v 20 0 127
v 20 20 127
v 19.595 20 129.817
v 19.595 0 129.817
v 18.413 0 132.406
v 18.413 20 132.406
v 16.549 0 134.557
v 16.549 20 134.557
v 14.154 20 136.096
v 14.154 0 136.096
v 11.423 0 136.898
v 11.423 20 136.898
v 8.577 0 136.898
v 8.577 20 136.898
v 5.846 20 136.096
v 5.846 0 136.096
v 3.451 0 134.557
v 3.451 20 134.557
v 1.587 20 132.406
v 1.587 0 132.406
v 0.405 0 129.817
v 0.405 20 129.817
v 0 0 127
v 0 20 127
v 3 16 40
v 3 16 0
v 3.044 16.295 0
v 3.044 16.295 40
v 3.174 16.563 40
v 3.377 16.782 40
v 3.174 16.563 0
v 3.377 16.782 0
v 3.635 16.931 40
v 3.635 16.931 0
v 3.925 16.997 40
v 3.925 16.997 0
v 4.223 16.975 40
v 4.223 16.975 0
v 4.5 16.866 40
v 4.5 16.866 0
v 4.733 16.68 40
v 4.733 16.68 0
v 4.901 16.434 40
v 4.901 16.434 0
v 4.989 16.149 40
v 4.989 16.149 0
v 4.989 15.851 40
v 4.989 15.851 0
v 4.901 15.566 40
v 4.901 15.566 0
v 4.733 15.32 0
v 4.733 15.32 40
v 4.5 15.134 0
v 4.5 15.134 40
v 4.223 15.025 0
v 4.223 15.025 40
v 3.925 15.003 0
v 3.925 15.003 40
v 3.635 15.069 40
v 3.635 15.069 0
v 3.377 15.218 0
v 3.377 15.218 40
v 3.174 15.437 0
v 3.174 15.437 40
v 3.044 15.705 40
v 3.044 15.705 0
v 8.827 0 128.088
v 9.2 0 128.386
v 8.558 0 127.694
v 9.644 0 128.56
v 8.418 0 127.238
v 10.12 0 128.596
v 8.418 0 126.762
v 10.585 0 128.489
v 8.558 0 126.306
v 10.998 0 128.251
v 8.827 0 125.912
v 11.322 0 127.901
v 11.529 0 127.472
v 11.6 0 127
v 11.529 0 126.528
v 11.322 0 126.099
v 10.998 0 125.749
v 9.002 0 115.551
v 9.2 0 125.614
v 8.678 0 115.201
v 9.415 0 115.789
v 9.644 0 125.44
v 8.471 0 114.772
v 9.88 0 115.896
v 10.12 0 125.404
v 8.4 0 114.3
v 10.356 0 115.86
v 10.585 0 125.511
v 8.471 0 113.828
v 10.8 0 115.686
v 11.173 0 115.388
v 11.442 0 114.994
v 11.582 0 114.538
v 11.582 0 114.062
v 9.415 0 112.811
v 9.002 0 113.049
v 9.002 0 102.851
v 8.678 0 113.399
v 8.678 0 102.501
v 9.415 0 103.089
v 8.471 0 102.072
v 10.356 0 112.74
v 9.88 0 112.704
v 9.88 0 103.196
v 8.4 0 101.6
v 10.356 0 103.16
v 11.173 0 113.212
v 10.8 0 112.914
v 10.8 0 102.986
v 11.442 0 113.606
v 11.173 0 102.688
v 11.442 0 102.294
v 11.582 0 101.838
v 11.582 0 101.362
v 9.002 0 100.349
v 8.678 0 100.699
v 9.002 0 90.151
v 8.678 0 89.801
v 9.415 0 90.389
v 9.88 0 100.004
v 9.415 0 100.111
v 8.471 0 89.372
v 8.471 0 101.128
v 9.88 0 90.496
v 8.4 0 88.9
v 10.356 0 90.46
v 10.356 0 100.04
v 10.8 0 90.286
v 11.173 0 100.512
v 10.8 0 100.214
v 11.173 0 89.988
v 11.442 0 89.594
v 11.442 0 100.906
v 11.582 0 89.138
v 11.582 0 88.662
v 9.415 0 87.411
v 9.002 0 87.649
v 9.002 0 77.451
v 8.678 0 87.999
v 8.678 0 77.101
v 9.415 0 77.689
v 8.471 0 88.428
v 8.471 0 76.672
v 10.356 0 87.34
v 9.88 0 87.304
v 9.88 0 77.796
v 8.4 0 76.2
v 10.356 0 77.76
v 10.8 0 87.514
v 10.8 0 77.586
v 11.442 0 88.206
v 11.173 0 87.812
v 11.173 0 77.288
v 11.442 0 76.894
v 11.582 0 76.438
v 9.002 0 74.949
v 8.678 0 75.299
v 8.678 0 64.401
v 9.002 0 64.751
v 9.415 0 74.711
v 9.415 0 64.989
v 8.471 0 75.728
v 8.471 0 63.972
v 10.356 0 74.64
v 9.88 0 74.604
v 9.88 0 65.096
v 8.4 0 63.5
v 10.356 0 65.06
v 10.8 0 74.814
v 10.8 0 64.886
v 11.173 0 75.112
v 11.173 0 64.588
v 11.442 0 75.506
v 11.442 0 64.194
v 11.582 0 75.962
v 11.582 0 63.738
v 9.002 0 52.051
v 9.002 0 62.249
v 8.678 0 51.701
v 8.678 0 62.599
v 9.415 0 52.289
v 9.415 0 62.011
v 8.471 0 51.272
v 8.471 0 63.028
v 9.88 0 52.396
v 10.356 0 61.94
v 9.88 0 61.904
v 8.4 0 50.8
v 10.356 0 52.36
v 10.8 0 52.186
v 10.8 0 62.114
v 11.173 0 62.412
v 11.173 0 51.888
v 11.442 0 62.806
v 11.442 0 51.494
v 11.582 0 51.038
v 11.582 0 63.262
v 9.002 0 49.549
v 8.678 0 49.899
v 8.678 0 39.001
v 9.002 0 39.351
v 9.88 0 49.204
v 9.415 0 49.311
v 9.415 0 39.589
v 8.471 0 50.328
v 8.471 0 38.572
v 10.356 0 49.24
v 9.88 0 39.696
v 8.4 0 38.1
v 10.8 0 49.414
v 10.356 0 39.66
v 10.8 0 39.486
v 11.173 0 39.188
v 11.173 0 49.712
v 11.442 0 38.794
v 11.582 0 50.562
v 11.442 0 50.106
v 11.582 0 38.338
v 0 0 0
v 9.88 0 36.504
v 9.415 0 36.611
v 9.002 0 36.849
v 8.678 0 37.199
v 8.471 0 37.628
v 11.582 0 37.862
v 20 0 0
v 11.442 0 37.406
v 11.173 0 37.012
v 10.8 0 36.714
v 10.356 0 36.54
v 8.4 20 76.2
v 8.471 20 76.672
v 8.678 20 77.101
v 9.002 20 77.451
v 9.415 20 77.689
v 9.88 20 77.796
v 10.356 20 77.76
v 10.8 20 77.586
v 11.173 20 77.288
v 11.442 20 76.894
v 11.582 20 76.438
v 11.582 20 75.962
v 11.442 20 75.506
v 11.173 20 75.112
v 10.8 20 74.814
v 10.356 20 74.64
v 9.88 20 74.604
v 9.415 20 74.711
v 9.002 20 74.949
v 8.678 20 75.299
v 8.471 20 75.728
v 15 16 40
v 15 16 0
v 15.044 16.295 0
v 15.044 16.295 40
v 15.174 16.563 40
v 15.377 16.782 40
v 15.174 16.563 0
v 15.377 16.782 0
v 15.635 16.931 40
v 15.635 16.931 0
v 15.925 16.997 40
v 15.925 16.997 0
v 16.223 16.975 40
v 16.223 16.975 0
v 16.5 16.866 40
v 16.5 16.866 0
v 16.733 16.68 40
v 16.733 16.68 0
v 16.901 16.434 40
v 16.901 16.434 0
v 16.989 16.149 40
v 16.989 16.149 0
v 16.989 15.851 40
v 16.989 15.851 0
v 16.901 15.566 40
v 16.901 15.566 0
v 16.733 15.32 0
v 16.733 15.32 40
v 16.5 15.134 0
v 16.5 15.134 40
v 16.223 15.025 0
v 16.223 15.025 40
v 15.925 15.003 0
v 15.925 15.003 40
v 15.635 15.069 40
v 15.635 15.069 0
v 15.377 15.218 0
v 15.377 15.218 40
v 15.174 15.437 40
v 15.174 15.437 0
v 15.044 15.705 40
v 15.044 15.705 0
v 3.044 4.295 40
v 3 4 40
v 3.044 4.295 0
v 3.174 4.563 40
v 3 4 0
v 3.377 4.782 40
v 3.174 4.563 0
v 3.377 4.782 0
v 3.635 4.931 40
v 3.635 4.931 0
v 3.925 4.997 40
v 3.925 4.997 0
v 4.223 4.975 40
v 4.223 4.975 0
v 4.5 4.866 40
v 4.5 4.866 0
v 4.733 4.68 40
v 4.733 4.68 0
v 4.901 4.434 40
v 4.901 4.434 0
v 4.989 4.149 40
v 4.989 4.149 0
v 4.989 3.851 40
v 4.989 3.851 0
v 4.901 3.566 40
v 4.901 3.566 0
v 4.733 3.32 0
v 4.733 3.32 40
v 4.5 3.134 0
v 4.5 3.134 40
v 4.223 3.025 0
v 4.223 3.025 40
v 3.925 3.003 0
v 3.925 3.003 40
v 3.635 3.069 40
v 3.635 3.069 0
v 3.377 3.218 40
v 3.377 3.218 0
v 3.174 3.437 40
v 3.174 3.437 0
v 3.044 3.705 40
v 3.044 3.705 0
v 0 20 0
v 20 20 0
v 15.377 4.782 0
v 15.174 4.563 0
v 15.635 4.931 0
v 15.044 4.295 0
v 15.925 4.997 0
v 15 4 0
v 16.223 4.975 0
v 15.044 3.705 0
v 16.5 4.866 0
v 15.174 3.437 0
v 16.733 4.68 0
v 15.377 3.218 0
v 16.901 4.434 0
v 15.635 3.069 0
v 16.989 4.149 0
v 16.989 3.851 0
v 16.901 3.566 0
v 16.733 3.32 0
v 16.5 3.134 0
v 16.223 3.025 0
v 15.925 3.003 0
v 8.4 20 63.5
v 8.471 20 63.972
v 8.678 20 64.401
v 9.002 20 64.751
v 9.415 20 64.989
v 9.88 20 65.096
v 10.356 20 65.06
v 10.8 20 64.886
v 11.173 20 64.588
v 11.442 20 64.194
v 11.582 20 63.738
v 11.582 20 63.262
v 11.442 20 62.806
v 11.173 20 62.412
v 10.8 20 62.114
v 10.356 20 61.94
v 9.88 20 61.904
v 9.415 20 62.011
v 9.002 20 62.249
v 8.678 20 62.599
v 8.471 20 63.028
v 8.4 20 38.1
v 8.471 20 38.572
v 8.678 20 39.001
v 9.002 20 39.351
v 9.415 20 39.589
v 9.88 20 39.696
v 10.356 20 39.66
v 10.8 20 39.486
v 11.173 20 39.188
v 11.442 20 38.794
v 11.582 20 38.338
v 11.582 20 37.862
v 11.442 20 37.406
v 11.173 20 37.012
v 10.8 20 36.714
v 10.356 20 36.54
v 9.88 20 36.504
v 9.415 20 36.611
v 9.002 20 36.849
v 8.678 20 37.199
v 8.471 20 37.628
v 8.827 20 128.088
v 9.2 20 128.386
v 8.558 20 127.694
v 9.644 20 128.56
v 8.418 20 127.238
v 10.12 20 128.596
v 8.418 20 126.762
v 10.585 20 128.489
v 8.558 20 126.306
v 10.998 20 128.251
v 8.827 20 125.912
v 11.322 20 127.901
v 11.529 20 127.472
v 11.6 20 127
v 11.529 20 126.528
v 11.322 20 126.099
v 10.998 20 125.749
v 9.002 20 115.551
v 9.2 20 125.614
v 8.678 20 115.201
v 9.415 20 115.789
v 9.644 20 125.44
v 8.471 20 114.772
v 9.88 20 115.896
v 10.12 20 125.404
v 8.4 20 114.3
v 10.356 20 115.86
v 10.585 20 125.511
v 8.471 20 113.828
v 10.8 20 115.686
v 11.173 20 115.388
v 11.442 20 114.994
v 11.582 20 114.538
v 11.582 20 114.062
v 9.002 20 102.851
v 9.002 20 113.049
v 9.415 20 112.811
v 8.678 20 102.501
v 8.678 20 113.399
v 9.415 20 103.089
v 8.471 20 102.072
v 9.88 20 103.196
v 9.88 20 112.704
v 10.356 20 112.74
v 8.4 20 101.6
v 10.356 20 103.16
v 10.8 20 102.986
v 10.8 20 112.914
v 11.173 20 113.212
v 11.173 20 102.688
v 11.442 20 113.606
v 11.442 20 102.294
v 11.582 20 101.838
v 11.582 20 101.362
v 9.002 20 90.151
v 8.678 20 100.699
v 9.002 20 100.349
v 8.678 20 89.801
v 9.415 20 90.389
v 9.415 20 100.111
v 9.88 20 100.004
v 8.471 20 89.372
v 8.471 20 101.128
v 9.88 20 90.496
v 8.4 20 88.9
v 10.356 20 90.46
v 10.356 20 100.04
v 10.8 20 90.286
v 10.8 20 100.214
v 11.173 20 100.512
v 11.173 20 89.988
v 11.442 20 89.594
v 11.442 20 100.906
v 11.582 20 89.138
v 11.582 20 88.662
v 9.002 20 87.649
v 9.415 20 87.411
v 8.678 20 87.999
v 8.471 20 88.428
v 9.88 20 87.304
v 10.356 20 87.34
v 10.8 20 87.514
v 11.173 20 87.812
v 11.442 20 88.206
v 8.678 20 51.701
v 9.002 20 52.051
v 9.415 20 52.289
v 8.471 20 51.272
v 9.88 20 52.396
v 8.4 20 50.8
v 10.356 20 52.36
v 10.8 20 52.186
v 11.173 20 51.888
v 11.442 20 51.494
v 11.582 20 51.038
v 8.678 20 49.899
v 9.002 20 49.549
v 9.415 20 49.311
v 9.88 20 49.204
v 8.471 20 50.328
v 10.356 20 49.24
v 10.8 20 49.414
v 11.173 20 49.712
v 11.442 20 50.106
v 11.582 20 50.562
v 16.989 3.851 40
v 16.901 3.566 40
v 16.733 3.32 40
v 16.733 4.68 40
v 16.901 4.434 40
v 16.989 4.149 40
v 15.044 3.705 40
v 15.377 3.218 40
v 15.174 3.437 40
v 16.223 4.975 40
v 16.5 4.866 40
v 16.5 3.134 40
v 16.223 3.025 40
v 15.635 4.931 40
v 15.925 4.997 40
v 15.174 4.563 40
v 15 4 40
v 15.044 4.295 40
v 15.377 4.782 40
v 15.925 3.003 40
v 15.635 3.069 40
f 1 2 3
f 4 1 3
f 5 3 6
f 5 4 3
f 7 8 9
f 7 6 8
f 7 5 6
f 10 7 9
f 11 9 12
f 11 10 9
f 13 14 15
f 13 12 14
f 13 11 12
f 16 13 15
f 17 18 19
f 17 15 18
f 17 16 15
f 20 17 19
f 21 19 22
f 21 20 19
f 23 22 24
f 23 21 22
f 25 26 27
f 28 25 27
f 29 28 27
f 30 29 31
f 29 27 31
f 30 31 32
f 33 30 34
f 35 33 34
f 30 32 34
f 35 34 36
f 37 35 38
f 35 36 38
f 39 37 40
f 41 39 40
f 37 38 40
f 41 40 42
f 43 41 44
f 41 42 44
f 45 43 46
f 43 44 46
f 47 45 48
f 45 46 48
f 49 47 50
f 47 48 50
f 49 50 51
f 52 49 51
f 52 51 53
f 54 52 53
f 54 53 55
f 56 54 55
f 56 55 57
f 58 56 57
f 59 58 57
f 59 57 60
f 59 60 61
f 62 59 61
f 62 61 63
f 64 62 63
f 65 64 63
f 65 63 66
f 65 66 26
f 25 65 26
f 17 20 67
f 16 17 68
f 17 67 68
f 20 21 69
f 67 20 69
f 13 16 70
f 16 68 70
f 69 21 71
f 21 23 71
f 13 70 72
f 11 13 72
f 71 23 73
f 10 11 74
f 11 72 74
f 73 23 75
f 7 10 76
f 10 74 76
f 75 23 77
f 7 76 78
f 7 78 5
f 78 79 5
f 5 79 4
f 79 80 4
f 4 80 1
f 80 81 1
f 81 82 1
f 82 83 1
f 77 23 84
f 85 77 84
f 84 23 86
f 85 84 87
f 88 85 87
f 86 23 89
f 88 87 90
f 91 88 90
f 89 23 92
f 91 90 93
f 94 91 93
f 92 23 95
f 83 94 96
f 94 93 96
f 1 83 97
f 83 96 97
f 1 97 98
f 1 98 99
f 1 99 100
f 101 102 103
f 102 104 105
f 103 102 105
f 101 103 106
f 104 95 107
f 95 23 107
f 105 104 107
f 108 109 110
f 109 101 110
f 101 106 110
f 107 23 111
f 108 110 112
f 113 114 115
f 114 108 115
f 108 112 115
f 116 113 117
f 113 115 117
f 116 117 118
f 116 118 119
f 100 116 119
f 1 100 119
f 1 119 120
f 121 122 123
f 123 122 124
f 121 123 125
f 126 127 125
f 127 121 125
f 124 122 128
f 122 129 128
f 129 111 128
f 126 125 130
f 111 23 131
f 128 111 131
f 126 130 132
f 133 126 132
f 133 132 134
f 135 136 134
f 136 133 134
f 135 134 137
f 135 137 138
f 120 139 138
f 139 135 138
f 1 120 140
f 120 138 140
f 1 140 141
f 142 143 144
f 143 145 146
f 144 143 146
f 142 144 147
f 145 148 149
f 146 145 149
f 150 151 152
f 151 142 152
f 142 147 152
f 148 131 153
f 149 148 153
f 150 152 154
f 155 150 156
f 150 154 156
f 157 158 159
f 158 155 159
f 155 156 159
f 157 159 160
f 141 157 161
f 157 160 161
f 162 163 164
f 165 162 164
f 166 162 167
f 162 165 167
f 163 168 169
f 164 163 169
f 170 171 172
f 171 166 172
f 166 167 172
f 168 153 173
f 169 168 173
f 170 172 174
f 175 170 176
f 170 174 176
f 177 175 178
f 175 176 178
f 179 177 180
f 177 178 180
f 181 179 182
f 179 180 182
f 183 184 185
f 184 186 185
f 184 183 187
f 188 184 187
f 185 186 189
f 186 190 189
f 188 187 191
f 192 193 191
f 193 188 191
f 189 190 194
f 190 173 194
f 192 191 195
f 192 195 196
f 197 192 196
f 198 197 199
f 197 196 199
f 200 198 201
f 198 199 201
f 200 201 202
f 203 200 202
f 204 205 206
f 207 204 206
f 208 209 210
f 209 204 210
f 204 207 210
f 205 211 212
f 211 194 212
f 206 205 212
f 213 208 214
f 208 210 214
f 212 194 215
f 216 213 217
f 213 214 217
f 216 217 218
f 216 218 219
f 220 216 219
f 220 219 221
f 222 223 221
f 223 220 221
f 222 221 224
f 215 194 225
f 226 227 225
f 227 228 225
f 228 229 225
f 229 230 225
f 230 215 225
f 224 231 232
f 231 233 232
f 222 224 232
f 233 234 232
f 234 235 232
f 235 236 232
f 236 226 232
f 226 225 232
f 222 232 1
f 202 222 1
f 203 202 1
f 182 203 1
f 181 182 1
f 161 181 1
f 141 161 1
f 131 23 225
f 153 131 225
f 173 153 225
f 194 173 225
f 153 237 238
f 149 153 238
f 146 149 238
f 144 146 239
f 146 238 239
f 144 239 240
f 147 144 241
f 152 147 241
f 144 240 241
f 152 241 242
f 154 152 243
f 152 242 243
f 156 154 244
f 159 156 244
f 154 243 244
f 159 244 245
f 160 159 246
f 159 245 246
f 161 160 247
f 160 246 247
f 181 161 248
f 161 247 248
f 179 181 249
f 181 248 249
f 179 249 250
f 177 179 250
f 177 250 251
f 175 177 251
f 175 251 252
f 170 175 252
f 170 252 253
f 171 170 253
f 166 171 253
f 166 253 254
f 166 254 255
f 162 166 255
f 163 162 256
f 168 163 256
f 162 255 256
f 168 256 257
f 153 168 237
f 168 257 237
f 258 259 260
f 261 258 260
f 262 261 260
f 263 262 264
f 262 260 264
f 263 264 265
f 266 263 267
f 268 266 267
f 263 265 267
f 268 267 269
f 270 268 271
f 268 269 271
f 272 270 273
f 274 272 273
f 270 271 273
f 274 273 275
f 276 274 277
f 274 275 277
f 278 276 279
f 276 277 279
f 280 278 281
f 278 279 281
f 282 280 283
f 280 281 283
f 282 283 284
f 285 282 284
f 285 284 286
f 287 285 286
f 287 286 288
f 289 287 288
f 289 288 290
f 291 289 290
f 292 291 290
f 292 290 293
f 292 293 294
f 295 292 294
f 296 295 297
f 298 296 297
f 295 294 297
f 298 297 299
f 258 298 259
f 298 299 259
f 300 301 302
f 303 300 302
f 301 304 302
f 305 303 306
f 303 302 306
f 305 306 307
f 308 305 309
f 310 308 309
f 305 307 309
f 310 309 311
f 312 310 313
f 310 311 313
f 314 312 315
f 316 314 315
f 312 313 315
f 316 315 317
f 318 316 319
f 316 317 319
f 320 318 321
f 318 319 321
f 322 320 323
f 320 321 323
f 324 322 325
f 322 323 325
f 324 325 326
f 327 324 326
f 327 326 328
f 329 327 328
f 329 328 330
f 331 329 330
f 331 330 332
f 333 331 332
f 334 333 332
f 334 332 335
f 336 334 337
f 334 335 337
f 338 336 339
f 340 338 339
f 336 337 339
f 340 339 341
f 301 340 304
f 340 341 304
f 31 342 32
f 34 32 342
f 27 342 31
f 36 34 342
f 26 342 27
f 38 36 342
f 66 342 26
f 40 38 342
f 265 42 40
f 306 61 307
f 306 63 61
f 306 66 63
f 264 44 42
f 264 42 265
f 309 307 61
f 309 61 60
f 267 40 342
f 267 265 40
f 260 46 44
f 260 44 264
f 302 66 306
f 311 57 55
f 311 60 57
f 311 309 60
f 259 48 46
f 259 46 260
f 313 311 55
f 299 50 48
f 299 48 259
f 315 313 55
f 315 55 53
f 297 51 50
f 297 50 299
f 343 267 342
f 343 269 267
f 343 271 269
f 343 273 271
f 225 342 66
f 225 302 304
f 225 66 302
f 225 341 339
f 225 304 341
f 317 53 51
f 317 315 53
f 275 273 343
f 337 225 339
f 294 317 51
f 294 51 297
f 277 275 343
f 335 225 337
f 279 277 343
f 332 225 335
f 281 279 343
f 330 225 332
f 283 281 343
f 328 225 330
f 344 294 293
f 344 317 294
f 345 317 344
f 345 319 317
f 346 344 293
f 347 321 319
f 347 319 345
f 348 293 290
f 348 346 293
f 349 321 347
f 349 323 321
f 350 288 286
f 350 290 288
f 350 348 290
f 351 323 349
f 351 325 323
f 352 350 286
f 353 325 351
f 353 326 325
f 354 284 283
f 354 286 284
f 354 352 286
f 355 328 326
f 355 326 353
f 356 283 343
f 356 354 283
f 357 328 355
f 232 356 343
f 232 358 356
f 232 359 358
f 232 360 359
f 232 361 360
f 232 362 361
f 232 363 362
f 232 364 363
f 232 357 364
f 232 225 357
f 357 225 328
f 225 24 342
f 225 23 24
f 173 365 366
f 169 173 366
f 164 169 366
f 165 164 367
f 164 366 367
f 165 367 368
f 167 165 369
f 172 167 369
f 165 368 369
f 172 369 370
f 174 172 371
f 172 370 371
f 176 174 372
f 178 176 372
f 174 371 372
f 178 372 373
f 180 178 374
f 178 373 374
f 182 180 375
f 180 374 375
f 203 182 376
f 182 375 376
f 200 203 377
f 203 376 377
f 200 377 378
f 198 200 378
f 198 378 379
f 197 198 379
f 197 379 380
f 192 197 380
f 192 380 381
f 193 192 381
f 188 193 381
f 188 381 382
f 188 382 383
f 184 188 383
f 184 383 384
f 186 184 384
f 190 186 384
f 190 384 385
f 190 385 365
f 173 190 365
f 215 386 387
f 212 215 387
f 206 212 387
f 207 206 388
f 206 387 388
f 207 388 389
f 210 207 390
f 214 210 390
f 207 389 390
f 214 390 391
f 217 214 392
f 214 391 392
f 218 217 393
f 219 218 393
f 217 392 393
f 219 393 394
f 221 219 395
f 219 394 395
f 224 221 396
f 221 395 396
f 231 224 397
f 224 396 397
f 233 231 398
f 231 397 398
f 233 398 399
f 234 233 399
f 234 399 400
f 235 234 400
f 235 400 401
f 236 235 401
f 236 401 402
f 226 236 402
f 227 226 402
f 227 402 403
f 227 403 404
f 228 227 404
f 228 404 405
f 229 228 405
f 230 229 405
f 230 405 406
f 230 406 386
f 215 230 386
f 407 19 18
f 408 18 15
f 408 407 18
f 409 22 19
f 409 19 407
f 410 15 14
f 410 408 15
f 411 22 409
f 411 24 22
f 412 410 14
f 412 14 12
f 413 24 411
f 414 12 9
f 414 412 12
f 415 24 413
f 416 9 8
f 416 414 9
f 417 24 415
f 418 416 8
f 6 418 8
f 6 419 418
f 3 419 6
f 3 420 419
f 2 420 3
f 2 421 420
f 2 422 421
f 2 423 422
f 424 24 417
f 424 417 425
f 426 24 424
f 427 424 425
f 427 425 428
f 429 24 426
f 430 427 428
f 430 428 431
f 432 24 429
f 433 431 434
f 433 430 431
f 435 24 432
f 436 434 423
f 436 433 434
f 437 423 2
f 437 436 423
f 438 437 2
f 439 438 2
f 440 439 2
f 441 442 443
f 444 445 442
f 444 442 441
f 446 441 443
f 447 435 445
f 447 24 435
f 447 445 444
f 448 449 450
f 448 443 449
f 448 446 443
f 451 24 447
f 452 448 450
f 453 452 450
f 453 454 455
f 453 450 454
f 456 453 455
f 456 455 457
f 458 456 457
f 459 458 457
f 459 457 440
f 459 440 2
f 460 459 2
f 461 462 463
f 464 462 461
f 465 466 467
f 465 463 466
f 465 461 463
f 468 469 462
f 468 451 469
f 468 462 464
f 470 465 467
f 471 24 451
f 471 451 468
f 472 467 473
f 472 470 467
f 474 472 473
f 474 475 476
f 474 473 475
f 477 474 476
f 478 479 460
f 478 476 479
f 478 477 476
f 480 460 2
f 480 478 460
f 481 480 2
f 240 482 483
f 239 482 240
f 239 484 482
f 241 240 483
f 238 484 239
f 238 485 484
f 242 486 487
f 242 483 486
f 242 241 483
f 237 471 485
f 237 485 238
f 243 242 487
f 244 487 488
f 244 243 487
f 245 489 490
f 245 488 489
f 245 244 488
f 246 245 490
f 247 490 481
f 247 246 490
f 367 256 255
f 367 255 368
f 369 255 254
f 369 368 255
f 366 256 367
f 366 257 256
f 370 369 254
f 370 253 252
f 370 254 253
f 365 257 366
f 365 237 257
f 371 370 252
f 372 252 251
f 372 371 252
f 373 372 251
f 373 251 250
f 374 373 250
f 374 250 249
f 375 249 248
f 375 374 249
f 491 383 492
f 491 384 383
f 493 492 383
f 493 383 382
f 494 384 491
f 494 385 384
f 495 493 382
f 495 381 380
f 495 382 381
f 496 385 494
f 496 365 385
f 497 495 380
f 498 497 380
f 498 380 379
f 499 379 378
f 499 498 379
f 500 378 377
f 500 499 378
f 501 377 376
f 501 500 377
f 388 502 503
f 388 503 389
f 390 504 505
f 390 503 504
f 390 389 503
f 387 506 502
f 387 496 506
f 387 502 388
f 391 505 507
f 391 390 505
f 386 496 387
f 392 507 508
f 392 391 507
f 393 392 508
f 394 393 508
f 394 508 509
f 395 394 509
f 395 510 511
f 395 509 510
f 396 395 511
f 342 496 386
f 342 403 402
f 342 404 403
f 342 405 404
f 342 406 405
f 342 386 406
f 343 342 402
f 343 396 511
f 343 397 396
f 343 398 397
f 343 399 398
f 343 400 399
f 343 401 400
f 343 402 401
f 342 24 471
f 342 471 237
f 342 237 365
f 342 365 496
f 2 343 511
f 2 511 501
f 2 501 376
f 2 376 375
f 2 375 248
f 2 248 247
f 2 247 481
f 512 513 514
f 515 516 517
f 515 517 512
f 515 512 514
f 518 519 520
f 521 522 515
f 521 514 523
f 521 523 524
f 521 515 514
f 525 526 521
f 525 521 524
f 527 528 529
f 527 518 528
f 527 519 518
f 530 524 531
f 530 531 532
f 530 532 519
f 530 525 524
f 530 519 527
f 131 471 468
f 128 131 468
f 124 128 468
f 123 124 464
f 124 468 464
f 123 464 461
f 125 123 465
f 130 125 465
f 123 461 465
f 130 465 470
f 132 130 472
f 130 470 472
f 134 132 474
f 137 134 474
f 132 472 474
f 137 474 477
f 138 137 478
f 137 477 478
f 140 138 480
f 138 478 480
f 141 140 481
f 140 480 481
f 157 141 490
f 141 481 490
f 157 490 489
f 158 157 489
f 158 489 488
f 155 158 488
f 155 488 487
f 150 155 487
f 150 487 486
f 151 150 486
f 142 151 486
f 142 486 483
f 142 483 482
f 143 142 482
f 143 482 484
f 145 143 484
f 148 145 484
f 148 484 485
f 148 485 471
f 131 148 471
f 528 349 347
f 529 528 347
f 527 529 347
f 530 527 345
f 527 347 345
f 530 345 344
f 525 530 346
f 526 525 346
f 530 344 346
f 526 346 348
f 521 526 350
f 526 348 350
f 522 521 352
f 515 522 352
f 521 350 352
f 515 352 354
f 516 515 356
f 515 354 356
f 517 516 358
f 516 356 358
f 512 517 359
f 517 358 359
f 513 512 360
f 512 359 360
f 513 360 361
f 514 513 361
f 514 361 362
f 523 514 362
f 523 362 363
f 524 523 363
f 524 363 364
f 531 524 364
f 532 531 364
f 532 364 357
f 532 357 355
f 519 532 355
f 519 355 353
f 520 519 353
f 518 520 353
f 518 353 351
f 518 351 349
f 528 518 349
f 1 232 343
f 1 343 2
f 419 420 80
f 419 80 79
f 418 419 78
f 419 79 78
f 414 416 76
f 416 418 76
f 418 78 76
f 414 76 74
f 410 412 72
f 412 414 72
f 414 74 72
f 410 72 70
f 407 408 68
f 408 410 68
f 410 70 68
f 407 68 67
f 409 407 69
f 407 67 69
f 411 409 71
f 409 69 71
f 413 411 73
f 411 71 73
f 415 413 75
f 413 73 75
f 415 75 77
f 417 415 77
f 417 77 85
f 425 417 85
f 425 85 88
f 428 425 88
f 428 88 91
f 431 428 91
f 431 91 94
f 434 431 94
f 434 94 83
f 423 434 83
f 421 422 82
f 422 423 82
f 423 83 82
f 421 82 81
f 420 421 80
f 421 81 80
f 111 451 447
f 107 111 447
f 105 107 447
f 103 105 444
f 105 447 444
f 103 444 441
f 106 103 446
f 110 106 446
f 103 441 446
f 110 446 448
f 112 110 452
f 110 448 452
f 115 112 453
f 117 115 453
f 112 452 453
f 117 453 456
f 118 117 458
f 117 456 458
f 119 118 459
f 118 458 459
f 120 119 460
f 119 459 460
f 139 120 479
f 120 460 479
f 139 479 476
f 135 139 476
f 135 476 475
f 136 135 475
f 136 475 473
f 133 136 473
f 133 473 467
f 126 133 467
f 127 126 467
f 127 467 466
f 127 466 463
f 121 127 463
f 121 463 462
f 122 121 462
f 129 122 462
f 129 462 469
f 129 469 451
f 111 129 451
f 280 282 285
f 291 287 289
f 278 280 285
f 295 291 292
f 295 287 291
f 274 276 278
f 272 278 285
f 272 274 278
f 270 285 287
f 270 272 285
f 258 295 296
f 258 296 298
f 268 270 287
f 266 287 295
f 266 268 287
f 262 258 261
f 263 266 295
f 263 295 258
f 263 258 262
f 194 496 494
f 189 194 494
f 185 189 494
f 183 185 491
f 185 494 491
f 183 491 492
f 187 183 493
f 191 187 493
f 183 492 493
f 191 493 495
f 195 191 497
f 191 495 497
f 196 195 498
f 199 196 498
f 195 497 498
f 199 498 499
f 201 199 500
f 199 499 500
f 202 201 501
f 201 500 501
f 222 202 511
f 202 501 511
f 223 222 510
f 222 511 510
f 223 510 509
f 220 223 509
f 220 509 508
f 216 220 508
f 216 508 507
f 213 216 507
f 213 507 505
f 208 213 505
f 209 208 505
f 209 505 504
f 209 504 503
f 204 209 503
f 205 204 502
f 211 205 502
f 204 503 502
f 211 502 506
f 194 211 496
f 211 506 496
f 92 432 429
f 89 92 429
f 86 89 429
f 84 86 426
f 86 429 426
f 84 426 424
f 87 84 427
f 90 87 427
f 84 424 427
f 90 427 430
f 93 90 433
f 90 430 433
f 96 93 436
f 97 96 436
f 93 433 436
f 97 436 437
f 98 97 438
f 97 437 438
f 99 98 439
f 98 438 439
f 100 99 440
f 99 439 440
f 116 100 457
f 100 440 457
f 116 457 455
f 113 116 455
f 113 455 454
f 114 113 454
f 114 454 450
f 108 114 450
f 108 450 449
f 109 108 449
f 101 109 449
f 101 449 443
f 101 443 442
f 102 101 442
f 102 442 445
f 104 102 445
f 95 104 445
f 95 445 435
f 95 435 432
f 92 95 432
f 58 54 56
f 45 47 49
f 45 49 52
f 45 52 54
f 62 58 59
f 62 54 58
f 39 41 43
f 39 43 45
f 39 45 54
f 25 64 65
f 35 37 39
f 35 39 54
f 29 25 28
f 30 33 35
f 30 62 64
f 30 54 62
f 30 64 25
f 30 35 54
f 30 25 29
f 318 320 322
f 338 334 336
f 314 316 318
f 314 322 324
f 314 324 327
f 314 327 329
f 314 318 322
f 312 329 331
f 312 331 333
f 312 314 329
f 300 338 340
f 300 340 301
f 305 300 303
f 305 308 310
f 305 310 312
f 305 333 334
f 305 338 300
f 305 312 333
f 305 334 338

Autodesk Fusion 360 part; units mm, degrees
sketch "Sketch1" plane through (0, 0, 0) normal (0, 1, 0) x (1, 0, 0)
  line L0 (20, 0) -> (20, -127)
  line L1 (0, -127) -> (0, 0)
  arc A0 (0, -127) -> (20, -127) centre (10, -127) ccw
  line L2 (0, 0) -> (20, 0)
  circle A1 centre (10, -127) radius 1.6
  dimension "d1" = 20
  dimension "d2" = 127
  dimension "d3" = 3.2
extrude "Extrude1" add sketch "Sketch1" along normal blind 20
sketch "Sketch2" plane through (0, 0, 0) normal (0, 0, -1) x (-1, 0, 0)
  line L0 (-20, 0) -> (0, 0)
  line L1 (0, 0) -> (0, 20)
  line L2 (0, 20) -> (-20, 20)
  line L3 (-20, 20) -> (-20, 0)
  line L4 (-20, 20) -> (0, 20)
  line L5 (0, 20) -> (0, 0)
  line L6 (0, 0) -> (-20, 0)
  line L7 (-20, 0) -> (-20, 20)
  circle A0 centre (-16, 16) radius 1
  circle A1 centre (-4, 16) radius 1
  circle A2 centre (-16, 4) radius 1
  circle A3 centre (-4, 4) radius 1
  dimension "d6" = 2
  dimension "d7" = 2
  dimension "d8" = 2
  dimension "d9" = 2
  dimension "d16" = 4
  dimension "d17" = 4
  dimension "d18" = 4
  dimension "d19" = 4
  dimension "d20" = 4
  dimension "d21" = 4
  dimension "d22" = 4
  dimension "d23" = 4
extrude "Extrude2" cut sketch "Sketch2" against normal blind 40 contours A0 | A1 | A2 | A3
sketch "Sketch3" plane through (0, 20, 0) normal (0, 1, 0) x (-1, 0, 0)
  circle A0 centre (-10, 127) radius 1.6
  arc A1 (0, 127) -> (-20, 127) centre (-10, 127) ccw
  line L0 (-20, 127) -> (-20, 0)
  line L1 (-20, 0) -> (0, 0)
  line L2 (0, 0) -> (0, 127)
  circle A2 centre (-10, 114.3) radius 1.6
  circle A3 centre (-10, 101.6) radius 1.6
  circle A4 centre (-10, 88.9) radius 1.6
  circle A5 centre (-10, 76.2) radius 1.6
  circle A6 centre (-10, 63.5) radius 1.6
  circle A7 centre (-10, 50.8) radius 1.6
  circle A8 centre (-10, 38.1) radius 1.6
  dimension "d24" = 3.2
  dimension "d25" = 12.7
  dimension "d28" = 0
  dimension "d29" = -12.7
extrude "Extrude3" cut sketch "Sketch3" against normal blind 170 contours A2 | A3 | A4 | A5 | A6 | A7 | A8
